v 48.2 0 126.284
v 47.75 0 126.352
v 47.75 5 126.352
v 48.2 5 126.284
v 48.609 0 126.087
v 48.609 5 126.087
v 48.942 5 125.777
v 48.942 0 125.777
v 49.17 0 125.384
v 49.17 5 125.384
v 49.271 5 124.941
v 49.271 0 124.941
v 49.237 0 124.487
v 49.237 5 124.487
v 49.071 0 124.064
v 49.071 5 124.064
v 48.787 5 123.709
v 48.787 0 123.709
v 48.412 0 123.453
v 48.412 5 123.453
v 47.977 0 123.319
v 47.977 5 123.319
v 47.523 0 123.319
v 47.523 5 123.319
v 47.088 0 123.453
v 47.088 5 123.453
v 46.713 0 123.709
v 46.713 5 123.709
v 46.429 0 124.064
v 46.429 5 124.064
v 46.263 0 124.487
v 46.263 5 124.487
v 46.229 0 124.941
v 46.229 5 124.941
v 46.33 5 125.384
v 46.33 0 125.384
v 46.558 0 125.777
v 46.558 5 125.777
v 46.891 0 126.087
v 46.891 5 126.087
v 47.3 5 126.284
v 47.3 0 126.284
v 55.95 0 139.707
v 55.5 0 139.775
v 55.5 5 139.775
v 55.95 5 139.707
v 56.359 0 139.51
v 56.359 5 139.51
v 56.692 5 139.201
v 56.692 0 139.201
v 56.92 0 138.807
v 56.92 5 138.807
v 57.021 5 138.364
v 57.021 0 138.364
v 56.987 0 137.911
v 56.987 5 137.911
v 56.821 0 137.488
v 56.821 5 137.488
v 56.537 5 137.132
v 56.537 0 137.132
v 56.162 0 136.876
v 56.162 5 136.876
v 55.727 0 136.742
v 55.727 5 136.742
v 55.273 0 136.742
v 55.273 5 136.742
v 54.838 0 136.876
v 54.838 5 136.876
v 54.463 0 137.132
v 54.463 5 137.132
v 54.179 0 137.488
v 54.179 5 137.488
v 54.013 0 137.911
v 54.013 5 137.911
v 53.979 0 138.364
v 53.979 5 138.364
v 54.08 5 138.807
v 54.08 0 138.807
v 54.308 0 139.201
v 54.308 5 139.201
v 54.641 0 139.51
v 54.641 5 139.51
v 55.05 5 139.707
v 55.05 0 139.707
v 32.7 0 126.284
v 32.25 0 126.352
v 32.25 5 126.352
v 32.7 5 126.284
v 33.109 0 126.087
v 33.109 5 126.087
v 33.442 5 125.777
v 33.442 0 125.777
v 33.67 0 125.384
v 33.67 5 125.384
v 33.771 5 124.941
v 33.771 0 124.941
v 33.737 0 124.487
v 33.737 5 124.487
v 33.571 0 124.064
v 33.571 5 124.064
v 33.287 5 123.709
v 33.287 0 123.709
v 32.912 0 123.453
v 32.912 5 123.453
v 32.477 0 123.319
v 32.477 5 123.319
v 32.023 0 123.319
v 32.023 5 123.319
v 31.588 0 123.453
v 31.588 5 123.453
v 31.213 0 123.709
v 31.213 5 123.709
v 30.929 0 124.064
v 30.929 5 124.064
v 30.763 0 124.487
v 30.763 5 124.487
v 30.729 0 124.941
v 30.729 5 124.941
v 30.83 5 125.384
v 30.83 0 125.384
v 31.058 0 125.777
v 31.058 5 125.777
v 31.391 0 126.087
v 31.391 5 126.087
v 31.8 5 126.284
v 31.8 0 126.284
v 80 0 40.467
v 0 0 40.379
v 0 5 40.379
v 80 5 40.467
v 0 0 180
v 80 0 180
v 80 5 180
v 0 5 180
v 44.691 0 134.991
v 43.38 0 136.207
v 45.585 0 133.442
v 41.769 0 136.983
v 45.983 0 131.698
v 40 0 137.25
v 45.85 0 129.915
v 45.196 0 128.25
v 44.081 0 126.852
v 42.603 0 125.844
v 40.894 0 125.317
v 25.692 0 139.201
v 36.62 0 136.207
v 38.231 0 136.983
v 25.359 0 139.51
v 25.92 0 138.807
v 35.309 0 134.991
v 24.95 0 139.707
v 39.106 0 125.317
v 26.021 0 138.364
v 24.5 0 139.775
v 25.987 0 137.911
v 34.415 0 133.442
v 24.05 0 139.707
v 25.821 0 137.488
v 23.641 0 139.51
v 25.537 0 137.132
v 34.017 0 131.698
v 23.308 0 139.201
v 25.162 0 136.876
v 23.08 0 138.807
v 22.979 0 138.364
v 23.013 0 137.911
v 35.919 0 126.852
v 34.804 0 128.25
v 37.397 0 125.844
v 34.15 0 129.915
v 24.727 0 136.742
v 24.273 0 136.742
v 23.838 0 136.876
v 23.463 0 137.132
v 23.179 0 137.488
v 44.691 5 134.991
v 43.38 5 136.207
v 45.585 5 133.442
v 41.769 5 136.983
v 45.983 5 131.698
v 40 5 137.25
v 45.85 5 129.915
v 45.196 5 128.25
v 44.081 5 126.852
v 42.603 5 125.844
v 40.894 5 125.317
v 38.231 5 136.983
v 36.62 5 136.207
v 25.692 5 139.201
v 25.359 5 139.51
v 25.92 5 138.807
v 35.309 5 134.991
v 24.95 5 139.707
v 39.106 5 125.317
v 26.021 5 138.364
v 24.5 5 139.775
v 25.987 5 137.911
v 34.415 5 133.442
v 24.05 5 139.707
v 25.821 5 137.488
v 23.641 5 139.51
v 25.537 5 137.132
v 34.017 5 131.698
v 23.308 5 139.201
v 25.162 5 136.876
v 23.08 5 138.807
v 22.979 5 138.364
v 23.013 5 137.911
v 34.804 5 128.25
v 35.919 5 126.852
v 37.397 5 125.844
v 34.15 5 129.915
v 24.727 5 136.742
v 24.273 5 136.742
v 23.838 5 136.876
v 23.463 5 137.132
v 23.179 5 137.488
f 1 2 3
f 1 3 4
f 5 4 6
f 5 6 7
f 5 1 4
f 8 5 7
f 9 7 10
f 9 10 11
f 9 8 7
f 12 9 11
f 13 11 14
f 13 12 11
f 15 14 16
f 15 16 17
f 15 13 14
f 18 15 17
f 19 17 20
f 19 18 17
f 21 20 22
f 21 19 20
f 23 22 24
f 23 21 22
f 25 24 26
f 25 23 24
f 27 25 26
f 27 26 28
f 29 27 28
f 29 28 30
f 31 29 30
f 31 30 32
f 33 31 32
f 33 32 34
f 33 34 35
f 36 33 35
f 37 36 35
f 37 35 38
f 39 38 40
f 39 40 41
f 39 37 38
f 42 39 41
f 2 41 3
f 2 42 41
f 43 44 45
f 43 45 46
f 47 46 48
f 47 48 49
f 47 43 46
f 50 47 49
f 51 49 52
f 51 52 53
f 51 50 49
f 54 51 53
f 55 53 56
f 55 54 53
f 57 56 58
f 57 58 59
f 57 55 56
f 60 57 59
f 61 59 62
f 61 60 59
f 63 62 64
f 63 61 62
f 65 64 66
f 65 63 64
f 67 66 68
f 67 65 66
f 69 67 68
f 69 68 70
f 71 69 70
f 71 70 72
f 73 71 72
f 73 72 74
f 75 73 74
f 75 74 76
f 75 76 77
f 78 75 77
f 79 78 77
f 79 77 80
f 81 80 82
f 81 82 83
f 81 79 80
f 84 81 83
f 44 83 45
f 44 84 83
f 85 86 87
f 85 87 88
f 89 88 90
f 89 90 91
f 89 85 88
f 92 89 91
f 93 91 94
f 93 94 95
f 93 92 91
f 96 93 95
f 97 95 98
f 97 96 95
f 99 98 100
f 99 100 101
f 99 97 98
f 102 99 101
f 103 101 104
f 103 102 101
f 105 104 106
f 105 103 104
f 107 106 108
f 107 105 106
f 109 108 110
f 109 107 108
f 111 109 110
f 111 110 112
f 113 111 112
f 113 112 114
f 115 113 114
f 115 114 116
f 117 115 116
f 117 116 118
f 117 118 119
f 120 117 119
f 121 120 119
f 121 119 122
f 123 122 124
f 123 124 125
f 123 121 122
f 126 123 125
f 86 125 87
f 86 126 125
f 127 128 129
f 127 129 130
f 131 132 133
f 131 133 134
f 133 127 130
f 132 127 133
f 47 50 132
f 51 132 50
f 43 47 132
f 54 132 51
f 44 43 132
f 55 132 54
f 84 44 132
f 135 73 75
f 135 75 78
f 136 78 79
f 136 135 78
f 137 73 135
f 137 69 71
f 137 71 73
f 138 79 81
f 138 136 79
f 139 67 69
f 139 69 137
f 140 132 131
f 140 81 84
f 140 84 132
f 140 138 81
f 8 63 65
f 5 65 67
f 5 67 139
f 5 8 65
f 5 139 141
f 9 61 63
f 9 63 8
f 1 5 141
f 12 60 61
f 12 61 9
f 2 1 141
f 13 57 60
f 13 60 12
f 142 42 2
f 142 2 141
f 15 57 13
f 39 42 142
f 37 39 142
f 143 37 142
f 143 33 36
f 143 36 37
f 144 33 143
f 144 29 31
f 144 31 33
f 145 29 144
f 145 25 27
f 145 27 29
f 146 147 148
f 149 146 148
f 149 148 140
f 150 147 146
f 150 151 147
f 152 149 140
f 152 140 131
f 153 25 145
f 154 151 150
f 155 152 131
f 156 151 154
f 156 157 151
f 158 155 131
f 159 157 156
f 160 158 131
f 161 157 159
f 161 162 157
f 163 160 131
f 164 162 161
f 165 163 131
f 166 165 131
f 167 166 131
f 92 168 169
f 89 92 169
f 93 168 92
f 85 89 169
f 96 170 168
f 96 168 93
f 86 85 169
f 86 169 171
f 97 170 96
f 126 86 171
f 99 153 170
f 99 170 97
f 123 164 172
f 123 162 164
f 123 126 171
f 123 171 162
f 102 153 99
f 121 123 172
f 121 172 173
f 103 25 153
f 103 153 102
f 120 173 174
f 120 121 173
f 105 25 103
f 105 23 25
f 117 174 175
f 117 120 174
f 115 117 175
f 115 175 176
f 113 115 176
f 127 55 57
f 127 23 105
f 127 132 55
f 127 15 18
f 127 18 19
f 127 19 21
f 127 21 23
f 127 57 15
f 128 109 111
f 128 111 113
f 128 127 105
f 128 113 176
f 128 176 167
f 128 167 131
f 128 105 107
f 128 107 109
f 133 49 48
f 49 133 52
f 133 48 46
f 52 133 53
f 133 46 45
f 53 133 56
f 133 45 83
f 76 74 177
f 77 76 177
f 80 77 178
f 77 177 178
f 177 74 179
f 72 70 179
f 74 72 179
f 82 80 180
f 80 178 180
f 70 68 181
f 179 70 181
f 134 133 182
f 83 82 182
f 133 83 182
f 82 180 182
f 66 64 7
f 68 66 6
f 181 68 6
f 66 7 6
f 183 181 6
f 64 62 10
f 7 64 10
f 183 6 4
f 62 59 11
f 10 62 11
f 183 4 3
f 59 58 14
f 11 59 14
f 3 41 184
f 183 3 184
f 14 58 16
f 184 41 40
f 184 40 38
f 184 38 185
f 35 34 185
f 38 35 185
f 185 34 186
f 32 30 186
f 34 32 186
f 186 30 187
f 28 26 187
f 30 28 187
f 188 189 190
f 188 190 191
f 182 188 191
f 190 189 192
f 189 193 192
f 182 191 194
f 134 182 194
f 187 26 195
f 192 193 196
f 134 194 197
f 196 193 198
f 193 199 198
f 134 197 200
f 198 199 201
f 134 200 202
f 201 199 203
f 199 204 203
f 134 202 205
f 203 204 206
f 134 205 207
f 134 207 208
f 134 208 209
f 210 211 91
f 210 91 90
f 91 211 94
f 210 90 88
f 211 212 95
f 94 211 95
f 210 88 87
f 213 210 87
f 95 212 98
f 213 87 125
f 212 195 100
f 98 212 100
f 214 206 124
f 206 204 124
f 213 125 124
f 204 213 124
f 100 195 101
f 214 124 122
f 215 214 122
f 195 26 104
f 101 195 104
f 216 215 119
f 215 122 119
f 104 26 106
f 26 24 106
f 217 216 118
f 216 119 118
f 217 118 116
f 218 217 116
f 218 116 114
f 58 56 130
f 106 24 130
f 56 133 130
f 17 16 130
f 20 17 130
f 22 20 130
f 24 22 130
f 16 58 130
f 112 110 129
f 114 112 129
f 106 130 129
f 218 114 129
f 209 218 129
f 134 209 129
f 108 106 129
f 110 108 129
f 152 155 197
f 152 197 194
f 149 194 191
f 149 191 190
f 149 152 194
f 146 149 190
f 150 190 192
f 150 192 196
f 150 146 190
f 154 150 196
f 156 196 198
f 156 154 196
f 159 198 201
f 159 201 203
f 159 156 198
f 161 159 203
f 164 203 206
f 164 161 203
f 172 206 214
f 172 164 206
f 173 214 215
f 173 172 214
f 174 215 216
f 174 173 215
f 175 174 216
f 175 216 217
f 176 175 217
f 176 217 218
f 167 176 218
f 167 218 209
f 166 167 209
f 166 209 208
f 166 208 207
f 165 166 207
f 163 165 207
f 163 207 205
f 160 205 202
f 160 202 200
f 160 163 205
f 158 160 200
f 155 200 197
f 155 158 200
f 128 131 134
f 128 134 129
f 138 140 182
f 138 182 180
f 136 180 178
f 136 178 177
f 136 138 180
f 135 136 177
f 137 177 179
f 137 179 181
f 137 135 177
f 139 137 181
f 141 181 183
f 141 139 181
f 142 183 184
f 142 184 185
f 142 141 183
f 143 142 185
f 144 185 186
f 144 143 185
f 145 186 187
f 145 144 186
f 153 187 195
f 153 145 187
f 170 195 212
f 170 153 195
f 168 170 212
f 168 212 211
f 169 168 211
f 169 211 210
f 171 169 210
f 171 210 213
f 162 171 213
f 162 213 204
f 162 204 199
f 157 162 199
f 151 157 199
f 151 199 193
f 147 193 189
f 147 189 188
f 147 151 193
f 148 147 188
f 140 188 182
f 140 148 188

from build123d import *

# Parameters (mm, degrees)
SKETCH1_R           = 6
SKETCH1_R_2         = 1.525
BOSS_EXTRUDE1_DEPTH = 5


with BuildPart() as part:
    # Sketch1 → Boss-Extrude1 (new body)
    with BuildSketch(Plane(origin=(0, 0, 0), x_dir=(1, 0, 0), z_dir=(0, 1, 0))):
        Polygon((0, -40.379460215), (80, -40.467284232), (80, -180), (0, -180), align=None)
        with Locations(Location((40, -131.25, 0), (0, 0, 270))):
            Circle(SKETCH1_R, mode=Mode.SUBTRACT)
        with Locations(Location((24.5, -138.25, 0), (0, 0, 270))):
            Circle(SKETCH1_R_2, mode=Mode.SUBTRACT)
        with Locations(Location((55.5, -138.25, 0), (0, 0, 270))):
            Circle(SKETCH1_R_2, mode=Mode.SUBTRACT)
        with Locations(Location((32.25, -124.826606241, 0), (0, 0, 270))):
            Circle(SKETCH1_R_2, mode=Mode.SUBTRACT)
        with Locations(Location((47.75, -124.826606241, 0), (0, 0, 270))):
            Circle(SKETCH1_R_2, mode=Mode.SUBTRACT)
    extrude(amount=BOSS_EXTRUDE1_DEPTH)


solid = part.part
